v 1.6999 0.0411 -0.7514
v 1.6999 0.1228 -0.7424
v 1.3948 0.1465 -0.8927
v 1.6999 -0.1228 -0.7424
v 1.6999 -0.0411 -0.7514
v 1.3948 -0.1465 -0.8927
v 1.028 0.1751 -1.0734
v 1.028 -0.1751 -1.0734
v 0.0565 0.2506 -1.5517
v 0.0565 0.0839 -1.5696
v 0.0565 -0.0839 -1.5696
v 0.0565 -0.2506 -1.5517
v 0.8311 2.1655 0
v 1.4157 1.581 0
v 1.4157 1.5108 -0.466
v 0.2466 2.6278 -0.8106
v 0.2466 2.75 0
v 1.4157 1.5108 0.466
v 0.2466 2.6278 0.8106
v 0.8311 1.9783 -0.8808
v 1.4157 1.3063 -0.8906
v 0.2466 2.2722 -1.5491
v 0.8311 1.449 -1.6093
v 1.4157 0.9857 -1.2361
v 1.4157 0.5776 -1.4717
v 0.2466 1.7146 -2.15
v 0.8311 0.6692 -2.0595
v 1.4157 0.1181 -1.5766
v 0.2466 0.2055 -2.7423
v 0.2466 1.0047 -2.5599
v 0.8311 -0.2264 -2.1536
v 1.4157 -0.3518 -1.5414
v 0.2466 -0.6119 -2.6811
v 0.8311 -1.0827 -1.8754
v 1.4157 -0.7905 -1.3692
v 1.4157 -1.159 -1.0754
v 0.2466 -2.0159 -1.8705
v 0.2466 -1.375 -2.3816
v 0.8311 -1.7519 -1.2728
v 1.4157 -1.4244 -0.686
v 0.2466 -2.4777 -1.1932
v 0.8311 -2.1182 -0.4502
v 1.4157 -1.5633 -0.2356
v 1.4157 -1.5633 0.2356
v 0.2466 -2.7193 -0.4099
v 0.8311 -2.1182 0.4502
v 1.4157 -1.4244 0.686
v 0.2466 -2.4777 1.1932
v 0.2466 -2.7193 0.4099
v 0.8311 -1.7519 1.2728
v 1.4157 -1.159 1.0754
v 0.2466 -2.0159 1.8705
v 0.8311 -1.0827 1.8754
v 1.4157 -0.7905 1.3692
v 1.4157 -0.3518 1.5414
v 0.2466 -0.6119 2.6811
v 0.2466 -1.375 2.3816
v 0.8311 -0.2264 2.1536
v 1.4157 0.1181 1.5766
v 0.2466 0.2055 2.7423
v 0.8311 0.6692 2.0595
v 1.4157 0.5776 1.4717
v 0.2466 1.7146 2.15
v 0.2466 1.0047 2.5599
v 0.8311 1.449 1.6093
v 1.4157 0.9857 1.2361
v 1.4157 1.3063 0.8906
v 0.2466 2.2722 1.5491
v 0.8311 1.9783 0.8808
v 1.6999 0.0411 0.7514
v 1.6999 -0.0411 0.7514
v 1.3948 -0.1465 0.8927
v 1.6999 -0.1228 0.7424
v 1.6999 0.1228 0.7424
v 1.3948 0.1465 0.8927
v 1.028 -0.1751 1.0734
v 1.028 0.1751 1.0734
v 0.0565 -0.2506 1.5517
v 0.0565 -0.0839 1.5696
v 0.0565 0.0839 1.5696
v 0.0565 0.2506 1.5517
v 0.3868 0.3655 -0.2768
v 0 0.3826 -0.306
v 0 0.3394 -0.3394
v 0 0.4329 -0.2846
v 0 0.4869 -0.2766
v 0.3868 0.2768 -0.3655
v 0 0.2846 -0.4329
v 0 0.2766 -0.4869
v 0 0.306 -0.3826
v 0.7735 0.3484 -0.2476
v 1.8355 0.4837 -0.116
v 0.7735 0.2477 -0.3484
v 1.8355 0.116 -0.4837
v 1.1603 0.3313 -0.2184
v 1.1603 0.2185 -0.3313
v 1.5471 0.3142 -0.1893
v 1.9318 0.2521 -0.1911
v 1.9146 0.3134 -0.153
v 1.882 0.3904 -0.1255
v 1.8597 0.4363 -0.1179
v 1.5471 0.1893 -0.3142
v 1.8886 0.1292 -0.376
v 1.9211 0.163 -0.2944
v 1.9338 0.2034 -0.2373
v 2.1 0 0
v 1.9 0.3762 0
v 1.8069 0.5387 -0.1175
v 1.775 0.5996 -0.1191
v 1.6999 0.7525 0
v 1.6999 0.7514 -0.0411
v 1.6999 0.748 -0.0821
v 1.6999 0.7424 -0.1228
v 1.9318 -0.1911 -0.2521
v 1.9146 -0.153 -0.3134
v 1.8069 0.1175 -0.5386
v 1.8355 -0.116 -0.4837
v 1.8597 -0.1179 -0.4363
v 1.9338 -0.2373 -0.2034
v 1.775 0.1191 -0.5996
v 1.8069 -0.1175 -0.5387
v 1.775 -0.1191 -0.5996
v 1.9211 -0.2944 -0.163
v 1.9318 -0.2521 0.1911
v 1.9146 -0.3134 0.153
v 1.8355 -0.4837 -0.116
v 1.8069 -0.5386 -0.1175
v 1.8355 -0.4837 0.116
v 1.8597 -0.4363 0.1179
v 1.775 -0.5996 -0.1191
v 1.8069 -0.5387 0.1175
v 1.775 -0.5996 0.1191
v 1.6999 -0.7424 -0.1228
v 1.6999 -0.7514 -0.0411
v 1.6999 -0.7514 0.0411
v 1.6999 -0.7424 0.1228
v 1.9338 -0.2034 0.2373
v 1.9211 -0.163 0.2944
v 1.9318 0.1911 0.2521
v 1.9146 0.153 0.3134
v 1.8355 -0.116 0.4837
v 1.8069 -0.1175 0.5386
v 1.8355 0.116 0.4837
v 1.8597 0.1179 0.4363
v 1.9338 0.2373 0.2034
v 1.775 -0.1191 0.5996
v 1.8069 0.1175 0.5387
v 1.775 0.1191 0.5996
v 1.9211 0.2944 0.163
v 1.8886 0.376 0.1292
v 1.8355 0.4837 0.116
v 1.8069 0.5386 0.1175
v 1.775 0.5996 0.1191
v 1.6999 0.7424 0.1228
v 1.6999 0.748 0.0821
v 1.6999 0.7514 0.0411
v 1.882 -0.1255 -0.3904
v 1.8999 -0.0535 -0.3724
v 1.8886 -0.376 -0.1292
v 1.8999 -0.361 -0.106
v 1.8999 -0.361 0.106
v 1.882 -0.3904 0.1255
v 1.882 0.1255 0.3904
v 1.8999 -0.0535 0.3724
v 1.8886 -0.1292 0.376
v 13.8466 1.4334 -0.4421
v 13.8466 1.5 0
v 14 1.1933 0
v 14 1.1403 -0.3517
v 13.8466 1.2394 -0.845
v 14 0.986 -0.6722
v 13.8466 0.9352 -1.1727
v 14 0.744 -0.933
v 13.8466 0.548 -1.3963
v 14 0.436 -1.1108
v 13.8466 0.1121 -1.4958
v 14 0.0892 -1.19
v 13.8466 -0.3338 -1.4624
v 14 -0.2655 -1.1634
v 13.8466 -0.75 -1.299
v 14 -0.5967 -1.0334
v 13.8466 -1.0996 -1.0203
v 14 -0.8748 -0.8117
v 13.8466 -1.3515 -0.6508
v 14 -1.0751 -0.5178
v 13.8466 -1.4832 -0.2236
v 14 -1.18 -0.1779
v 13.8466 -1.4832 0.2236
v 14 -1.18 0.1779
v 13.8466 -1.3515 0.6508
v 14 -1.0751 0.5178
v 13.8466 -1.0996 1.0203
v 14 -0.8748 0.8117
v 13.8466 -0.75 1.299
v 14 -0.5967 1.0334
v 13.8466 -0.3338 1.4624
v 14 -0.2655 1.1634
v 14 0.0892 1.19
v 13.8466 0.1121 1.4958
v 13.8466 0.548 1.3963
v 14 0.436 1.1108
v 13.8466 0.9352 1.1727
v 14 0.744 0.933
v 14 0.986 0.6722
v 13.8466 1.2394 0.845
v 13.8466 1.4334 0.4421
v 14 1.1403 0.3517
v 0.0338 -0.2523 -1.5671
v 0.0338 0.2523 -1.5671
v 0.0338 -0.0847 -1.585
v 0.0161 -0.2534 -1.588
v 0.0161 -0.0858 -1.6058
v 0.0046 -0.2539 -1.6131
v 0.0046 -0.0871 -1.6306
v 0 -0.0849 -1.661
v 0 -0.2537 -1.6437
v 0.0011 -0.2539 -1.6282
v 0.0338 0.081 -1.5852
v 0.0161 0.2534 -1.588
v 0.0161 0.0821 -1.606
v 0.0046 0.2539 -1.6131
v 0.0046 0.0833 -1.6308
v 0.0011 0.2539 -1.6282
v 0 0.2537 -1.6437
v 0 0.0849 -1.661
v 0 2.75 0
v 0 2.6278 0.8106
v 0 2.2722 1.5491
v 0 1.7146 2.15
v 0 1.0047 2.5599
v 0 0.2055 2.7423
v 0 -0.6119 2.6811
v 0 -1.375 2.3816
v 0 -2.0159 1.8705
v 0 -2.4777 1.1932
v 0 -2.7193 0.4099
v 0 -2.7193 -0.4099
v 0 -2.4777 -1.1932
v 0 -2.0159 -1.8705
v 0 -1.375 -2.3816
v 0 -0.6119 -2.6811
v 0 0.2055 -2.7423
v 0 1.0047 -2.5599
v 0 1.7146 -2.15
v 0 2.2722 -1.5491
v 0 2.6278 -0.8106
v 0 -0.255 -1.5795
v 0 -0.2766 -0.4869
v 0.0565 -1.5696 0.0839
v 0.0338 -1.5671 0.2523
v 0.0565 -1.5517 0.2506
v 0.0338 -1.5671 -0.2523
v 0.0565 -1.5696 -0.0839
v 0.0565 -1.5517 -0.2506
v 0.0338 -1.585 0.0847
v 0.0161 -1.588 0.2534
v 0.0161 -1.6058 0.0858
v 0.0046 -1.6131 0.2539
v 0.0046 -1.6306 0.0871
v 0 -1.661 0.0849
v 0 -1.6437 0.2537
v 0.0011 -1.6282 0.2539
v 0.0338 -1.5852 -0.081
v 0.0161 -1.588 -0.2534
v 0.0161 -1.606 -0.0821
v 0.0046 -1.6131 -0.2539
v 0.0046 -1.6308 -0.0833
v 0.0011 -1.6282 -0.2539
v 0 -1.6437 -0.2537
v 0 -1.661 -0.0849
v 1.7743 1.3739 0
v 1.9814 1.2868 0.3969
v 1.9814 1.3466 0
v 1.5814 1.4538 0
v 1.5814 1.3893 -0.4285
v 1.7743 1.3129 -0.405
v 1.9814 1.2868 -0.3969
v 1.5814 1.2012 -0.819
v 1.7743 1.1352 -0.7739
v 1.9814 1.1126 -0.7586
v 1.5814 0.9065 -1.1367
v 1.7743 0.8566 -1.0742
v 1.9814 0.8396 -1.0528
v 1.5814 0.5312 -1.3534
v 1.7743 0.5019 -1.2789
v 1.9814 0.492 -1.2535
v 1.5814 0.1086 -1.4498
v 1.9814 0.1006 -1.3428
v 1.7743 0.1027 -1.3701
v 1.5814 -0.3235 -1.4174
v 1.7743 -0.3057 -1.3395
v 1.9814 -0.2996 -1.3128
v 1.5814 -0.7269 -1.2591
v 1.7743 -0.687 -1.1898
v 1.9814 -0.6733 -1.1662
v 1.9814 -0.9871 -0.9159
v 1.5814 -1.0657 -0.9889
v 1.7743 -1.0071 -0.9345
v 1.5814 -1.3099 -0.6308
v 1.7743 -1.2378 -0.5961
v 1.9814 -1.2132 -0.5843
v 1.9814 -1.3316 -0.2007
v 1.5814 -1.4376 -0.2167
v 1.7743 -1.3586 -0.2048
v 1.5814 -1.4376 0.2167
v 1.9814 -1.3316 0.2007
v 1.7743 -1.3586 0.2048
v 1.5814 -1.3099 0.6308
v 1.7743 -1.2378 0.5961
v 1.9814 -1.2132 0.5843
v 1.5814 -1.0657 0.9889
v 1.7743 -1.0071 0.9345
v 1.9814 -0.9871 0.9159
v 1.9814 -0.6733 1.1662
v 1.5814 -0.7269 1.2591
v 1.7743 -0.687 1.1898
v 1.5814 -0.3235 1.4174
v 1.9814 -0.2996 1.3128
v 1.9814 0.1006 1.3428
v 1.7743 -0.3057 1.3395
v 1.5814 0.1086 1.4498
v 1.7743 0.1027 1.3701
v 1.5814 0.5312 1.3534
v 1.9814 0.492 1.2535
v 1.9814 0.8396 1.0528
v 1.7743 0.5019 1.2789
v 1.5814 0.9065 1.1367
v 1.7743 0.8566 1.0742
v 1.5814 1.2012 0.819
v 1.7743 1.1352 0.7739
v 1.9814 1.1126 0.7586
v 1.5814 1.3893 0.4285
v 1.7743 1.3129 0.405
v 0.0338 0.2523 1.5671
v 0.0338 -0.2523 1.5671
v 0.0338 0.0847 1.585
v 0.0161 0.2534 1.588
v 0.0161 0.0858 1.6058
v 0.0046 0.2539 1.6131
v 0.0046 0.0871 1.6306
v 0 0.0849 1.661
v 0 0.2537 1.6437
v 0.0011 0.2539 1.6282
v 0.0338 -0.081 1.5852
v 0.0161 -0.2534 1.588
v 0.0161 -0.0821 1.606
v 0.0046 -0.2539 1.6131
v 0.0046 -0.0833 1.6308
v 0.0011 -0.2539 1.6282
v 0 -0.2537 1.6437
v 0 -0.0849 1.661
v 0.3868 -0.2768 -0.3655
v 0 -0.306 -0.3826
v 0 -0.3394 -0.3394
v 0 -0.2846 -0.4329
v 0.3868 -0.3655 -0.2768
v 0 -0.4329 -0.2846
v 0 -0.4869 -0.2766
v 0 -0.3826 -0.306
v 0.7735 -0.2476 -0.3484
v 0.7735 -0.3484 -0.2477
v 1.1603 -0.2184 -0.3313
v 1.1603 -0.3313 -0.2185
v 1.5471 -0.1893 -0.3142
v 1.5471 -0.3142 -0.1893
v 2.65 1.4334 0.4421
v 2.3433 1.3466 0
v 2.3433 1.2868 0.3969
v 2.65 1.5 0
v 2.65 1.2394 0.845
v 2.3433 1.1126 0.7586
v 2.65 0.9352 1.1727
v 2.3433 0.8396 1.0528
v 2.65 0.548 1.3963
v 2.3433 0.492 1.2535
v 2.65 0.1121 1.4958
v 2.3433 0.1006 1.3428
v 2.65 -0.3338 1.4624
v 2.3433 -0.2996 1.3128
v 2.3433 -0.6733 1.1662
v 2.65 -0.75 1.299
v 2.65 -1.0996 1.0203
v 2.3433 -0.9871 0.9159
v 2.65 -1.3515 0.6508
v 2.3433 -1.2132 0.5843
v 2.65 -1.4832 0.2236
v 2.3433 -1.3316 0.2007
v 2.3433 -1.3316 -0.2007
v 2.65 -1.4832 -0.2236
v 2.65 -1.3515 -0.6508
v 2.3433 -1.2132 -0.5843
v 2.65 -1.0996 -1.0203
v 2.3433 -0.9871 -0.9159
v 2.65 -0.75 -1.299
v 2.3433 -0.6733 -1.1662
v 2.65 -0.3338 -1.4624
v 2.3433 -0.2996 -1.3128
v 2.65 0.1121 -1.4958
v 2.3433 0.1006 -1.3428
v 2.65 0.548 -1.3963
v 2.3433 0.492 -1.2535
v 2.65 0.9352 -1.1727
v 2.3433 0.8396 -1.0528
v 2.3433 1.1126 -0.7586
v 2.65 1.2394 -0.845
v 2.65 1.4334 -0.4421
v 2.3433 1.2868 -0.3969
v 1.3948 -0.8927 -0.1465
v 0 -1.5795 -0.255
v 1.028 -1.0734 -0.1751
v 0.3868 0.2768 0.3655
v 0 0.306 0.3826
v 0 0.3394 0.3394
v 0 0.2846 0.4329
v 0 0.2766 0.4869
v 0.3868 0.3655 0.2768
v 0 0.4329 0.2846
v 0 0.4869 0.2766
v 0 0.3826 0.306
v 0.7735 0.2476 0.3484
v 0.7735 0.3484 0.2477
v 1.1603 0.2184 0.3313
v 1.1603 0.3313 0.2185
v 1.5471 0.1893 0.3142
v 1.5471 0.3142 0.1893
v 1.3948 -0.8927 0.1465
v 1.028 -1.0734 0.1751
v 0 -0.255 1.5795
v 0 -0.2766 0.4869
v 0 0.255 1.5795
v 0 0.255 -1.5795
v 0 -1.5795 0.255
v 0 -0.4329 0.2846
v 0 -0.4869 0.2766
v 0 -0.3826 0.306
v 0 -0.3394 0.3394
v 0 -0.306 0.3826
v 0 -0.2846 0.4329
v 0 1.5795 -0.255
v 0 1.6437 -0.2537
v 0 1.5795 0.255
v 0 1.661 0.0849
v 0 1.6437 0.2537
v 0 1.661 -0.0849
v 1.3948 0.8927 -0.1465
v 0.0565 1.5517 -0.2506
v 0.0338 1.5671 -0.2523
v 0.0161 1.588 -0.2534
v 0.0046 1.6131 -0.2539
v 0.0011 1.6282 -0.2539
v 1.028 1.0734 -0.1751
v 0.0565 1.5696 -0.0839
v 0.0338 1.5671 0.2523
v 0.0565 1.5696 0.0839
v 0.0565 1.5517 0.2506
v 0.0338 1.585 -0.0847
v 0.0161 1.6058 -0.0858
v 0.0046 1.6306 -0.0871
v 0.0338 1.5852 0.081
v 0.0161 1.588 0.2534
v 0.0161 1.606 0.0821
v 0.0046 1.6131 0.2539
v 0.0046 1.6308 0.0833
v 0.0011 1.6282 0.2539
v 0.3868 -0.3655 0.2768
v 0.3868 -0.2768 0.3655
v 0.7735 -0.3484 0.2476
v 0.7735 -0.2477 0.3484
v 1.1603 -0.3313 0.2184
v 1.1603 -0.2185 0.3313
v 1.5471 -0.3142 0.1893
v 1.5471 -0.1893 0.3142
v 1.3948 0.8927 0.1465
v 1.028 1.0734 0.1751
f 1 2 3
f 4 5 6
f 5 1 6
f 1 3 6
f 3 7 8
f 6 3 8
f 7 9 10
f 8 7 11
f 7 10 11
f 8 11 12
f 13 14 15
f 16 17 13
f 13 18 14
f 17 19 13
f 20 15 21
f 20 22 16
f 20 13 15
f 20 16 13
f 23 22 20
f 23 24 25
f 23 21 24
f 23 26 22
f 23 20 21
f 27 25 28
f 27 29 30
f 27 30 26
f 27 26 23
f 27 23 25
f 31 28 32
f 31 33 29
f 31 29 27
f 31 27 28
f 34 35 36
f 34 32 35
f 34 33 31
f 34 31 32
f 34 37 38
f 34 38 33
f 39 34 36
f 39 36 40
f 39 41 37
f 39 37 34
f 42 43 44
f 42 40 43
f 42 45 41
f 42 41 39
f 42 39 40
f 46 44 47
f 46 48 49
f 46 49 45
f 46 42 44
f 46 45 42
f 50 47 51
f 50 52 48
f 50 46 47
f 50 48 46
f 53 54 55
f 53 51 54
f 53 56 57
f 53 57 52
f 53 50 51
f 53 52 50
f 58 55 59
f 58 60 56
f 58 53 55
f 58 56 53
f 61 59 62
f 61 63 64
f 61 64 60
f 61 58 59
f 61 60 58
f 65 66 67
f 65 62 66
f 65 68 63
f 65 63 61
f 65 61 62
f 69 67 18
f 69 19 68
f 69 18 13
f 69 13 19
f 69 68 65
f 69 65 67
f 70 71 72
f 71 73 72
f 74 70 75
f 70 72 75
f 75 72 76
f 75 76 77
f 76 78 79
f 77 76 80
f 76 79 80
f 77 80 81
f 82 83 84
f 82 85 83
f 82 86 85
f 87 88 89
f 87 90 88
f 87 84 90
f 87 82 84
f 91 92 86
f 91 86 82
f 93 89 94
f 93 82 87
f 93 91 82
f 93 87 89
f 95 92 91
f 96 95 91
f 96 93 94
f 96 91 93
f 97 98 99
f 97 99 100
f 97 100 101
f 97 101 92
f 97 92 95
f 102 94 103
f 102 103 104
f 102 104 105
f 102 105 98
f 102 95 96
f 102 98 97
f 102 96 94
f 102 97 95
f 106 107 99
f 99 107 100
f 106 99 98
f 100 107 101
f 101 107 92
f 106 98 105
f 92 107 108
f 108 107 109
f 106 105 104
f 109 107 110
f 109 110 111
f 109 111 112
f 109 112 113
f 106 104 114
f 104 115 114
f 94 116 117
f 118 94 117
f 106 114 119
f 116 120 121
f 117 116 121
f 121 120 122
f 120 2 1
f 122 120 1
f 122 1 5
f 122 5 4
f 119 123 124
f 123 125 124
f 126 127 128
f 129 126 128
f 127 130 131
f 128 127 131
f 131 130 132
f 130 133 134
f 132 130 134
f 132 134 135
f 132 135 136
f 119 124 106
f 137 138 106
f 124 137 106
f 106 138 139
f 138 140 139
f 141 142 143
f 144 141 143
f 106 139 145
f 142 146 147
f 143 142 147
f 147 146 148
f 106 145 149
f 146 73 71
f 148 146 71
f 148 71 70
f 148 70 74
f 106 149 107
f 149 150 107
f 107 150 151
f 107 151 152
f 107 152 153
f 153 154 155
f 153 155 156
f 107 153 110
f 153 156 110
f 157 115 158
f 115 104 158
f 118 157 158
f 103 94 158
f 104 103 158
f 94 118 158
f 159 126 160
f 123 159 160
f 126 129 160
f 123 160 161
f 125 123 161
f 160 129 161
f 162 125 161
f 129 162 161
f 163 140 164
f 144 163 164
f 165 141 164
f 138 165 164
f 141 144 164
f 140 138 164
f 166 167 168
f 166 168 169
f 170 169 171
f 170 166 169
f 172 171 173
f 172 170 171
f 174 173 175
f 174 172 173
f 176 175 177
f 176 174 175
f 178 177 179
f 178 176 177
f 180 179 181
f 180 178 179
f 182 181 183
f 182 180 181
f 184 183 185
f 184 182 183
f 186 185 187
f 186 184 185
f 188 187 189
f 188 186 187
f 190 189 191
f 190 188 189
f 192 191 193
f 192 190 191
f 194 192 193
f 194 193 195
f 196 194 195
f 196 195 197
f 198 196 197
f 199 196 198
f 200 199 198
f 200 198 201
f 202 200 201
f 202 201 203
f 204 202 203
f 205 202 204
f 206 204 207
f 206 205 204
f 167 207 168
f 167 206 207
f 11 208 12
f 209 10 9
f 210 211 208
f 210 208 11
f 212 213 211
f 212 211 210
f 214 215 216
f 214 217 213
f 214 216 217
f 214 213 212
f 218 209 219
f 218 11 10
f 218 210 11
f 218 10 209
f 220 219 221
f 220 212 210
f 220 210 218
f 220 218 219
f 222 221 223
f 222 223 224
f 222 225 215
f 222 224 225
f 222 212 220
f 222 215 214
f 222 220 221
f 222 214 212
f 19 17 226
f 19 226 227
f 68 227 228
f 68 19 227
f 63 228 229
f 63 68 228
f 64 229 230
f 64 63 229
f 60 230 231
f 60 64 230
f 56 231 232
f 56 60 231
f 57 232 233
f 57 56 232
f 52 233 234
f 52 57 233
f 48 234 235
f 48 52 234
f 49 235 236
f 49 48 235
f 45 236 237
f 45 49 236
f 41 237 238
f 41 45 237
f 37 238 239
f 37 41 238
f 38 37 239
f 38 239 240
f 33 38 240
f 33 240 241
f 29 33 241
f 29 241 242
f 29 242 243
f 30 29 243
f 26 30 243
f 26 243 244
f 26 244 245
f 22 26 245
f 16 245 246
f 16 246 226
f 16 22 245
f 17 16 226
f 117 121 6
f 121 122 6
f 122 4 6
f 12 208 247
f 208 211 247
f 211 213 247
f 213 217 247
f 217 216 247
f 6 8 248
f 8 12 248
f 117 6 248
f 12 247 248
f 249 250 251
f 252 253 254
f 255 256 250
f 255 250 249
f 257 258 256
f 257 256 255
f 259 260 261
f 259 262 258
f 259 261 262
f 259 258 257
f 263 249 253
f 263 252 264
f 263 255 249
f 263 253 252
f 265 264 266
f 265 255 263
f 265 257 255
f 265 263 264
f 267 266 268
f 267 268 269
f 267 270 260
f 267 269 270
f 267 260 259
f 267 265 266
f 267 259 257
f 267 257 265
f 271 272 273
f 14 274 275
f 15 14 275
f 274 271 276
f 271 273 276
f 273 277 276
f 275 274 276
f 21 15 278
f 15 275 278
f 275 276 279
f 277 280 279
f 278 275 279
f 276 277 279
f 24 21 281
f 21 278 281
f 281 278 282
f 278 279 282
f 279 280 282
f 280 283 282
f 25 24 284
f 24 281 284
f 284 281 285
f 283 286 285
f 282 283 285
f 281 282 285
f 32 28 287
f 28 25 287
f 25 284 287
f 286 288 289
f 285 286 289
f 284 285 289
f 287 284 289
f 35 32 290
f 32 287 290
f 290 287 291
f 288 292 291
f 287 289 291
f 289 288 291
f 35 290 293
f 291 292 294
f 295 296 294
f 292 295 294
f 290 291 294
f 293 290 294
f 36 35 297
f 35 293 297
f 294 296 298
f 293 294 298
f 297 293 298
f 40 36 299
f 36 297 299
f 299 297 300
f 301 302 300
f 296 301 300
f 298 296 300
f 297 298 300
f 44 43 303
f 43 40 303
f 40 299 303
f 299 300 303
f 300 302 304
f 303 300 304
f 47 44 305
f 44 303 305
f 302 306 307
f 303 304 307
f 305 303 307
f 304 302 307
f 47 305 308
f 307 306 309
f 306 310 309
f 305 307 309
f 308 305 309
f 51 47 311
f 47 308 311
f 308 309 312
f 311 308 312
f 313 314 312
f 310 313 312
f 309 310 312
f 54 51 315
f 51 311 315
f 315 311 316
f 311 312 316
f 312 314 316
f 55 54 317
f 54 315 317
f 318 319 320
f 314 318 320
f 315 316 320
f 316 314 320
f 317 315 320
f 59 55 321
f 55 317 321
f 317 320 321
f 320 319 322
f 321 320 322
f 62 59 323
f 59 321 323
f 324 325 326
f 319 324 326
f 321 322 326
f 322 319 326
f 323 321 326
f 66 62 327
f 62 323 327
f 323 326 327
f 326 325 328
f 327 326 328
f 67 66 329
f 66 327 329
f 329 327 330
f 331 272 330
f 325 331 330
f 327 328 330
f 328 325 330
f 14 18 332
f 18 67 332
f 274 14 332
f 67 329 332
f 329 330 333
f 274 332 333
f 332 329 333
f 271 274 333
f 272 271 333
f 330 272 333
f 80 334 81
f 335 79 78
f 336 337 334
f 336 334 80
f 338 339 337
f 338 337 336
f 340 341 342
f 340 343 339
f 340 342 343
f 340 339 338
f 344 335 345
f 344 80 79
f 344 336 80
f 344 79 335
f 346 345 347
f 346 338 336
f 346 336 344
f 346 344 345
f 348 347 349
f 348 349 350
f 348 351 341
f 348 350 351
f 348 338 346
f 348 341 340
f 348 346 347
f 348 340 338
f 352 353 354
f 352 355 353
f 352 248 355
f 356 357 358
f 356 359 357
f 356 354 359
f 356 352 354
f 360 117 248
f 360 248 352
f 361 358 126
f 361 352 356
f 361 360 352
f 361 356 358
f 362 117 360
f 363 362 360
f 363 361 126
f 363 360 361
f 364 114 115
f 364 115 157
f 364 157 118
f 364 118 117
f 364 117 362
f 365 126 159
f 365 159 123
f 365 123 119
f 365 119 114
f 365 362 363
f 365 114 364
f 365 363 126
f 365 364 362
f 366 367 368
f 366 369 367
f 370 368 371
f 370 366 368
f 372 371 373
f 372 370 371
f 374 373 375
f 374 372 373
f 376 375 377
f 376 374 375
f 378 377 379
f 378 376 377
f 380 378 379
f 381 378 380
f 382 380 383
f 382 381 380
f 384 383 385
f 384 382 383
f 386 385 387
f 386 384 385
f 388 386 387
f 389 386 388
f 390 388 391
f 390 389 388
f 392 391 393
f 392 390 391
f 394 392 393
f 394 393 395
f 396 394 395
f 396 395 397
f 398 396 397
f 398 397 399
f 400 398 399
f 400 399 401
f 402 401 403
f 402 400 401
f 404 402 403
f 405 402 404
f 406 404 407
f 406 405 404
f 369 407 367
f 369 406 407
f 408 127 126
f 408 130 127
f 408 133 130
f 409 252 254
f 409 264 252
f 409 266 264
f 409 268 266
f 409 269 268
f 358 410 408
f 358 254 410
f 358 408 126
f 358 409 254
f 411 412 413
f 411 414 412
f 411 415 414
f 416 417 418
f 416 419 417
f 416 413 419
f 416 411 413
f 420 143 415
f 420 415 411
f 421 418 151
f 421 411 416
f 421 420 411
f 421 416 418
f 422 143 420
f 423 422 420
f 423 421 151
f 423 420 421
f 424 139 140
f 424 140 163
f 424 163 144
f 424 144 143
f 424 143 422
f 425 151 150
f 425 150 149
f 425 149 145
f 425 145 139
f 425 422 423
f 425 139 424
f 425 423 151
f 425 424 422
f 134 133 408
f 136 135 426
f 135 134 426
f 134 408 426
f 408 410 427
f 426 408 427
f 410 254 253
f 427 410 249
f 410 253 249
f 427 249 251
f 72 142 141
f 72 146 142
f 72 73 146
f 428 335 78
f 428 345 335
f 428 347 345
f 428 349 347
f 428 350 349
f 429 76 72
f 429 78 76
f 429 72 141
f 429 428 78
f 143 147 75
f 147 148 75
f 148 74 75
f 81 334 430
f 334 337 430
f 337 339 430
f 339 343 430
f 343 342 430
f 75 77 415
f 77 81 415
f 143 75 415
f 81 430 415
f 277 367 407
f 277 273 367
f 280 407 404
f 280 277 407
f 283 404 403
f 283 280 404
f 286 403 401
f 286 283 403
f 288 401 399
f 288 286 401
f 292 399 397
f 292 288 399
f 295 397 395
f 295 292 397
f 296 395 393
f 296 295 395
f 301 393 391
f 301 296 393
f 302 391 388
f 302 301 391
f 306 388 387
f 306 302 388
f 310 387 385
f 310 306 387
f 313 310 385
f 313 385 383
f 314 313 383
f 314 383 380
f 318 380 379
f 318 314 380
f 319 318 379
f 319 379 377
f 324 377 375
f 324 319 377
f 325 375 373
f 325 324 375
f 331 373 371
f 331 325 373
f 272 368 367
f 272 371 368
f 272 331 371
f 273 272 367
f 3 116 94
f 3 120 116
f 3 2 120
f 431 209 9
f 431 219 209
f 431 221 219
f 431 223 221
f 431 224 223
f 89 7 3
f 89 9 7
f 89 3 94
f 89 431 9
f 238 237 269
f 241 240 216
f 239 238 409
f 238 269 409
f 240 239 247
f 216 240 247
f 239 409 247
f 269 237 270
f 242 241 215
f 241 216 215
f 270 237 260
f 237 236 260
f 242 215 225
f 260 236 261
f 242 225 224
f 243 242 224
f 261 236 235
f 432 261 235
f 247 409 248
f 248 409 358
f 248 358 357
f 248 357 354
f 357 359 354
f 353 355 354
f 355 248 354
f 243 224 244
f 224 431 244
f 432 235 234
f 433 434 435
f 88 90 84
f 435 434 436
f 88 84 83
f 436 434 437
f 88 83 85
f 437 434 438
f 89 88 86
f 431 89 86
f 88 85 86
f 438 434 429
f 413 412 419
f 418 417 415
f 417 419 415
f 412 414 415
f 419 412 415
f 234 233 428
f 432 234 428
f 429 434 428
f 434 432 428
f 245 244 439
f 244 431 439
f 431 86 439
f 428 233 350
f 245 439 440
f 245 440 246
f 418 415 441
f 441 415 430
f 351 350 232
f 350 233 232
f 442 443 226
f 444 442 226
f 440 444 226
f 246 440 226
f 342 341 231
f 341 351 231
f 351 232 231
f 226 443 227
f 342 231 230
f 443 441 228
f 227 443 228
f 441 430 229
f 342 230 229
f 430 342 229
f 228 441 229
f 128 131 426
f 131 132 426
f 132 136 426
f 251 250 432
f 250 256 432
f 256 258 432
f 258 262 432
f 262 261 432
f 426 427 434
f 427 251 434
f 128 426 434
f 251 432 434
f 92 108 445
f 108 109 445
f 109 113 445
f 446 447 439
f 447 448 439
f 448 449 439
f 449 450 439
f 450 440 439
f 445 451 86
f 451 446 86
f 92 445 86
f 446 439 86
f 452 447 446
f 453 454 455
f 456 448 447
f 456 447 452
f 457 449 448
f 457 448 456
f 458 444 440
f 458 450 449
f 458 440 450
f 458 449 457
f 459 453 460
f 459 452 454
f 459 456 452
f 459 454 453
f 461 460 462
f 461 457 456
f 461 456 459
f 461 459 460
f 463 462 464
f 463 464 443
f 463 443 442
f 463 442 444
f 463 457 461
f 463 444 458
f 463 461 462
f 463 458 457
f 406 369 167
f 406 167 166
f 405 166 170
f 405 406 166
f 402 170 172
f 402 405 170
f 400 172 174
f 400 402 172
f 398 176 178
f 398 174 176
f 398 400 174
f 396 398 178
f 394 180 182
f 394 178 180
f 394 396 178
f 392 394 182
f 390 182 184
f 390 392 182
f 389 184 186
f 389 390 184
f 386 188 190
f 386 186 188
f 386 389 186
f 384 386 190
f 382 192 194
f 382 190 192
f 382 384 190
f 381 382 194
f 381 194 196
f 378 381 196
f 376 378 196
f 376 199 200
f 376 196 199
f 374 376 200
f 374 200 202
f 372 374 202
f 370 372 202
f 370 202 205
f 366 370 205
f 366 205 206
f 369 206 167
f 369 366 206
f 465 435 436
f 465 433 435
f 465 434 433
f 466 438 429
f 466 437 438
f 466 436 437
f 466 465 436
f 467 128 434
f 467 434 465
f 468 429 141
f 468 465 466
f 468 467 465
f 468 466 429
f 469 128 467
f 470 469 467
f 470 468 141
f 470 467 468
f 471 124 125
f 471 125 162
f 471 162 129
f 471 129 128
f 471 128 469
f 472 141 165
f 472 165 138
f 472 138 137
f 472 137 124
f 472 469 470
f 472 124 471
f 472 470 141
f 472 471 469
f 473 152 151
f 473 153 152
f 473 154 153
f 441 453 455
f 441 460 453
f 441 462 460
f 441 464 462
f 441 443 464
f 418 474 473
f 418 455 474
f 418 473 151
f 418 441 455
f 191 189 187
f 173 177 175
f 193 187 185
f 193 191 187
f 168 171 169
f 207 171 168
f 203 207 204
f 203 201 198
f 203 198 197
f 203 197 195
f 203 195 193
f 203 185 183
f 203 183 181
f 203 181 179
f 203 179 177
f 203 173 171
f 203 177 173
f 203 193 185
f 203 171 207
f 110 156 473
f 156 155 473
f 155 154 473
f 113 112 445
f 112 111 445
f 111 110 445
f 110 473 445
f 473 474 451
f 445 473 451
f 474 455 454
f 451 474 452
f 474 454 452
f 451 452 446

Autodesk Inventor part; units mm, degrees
ref_plane "YZ Plane" through (0, 0, 0) normal (1, 0, 0) x (0, 1, 0)
ref_plane "XZ Plane" through (0, 0, 0) normal (0, 1, 0) x (-1, 0, 0)
sketch "Sketch1" plane through (0, 0, 0) normal (0, 0, 1) x (1, 0, 0)
  line L0 (2.1, 0) -> (14, 0)
  line L1 (14, 0) -> (14, 1.5)
  line L2 (14, 1.5) -> (2.65, 1.5)
  line L3 (2.65, 1.5) -> (2.3433, 1.3466)
  line L4 (2.3433, 1.3466) -> (1.9814, 1.3466)
  line L5 (0, 2.75) -> (0, 1.6)
  line L6 (0, 1.6) -> (1.6999, 0.7525)
  line L7 (1.6999, 0.7525) -> (2.1, 0)
  line L8 (-2.8, 0) -> (16.8, 0) projected
  line L9 (0, -0.55) -> (0, 3.3) projected
  line L10 (0, 2.75) -> (0.2466, 2.75)
  line L11 (0.2466, 2.75) -> (1.4157, 1.581)
  line L12 (2.65, 1.5) -> (1.4966, 1.5) construction
  arc A0 (1.4157, 1.581) -> (1.9814, 1.3466) centre (1.9814, 2.1466) ccw
  point P0 (1.65, 1.3466)
  dimension "d1" = 11.35
  dimension "d2" = 3
  dimension "d3" = 2.6933
  dimension "d4" = 3.2
  dimension "d5" = 26.5
  dimension "d6" = 62
  dimension "d7" = 2.1
  dimension "d8" = 0.3067
  dimension "d12" = 5.5
  dimension "d13" = 45
  dimension "d15" = 14
  dimension "d24" = 1.65
  dimension "d93" = 0.8
revolve "Body" add sketch "Sketch1" angle 360 about axis through (2.1, 0, 0) along (1, 0, 0) contours L7 L6 L5 L10 L11 A0 L4 L3 L2 L1 L0
sketch "Sketch2" plane through (0, 0, 0) normal (-1, 0, 0) x (0, 0, 1)
  line L0 (0, 1.6) -> (0, 0) construction
  line L1 (0, 0) -> (1.6, 0) construction
  arc A0 (0.48, 0) -> (0, 0.48) centre (0, 0) ccw construction
  arc A1 (0.56, 0) -> (0, 0.56) centre (0, 0) ccw construction
  arc A2 (1.5795, 0.255) -> (0.255, 1.5795) centre (0, 0) ccw
  line L2 (0, 0) -> (1.1314, 1.1314) construction
  line L3 (0.255, 1.5795) -> (0.2766, 0.4869)
  line L4 (1.5795, 0.255) -> (0.4869, 0.2766)
  arc A3 (0.255, 1.5795) -> (0, 1.6) centre (0, 0) ccw
  arc A4 (1.6, 0) -> (1.5795, 0.255) centre (0, 0) ccw
  line L5 (0, -3.85) -> (0, 3.85) projected
  line L6 (-3.85, 0) -> (3.85, 0) projected
  arc A5 (0.255, -1.5795) -> (1.5795, -0.255) centre (0, 0) ccw
  line L7 (0.255, -1.5795) -> (0.2766, -0.4869)
  line L8 (1.5795, -0.255) -> (0.4869, -0.2766)
  arc A6 (0, -1.6) -> (0.255, -1.5795) centre (0, 0) ccw
  arc A7 (1.5795, -0.255) -> (1.6, 0) centre (0, 0) ccw
  arc A8 (-0.255, 1.5795) -> (-1.5795, 0.255) centre (0, 0) ccw
  line L9 (-0.255, 1.5795) -> (-0.2766, 0.4869)
  line L10 (-1.5795, 0.255) -> (-0.4869, 0.2766)
  arc A9 (0, 1.6) -> (-0.255, 1.5795) centre (0, 0) ccw
  arc A10 (-1.5795, 0.255) -> (-1.6, 0) centre (0, 0) ccw
  arc A11 (-0.255, -1.5795) -> (0, -1.6) centre (0, 0) ccw
  arc A12 (-1.5795, -0.255) -> (-0.255, -1.5795) centre (0, 0) ccw
  arc A13 (-1.6, 0) -> (-1.5795, -0.255) centre (0, 0) ccw
  line L11 (-1.5795, -0.255) -> (-0.4869, -0.2766)
  line L12 (-0.255, -1.5795) -> (-0.2766, -0.4869)
  arc A14 (0.2766, 0.4869) -> (0.4869, 0.2766) centre (0.4912, 0.4912) ccw
  arc A15 (0.4869, -0.2766) -> (0.2766, -0.4869) centre (0.4912, -0.4912) ccw
  arc A16 (-0.4869, 0.2766) -> (-0.2766, 0.4869) centre (-0.4912, 0.4912) ccw
  arc A17 (-0.2766, -0.4869) -> (-0.4869, -0.2766) centre (-0.4912, -0.4912) ccw
  point P0 (1.1314, -1.1314)
  point P1 (-1.1314, 1.1314)
  point P2 (-1.1314, -1.1314)
  dimension "d17" = 0.96
  dimension "d18" = 1.12
  dimension "d19" = 3.2
  dimension "d20" = 45
  dimension "d21" = 0.255
extrude "Slot" add sketch "Sketch2" against normal up to next draft 5 contours L4 A14 L3 A2 | A5 L7 A15 L8 | L9 A16 L10 A8 | A12 L11 A17 L12
fillet "Fillet1" radius 0.102 4 edges at (0, 1.6, 0) (0, 0, -1.6) (0, -1.6, 0) (0, 0, 1.6)
thread "Thread" size "M3x0.5" class "6g" standard "ISO Metric profile" length 11.35
chamfer "Chamfer1" distance 0.3067 distance2 0.1534 1 edges at (14, -1.5, 0) measured on face at (14, 0.263, 0.1197)
ref_plane "Work Plane2" through (3.35, 0, 0) normal (0, 0, -1) x (1, 0, 0)
equation "\"d1\" = GEL"
equation "\"d2\" = GD"
equation "\"d3\" = BDM"
equation "\"d4\" = SDM"
equation "\"d7\" = INTI"
equation "\"d8\" = GAL"
equation "\"d12\" = KOD"
equation "\"d13\" = 0.5 * SEWI"
equation "\"d15\" = NLG"
equation "\"d24\" = KOH"
equation "\"d93\" = R"
equation "\"d17\" = 0.3 * SDM"
equation "\"d18\" = 0.35 * SDM"
equation "\"d19\" = SDM"
equation "\"d21\" = 0.5 * SBR"
equation "\"d23\" = 0.2 * SBR"
equation "\"d10\" = GEL"
equation "\"d25\" = -0.5 * SPD + 0.5 * GD"
equation "\"d26\" = 0.5 * GAL"
equation "\"NLG\" = 14"
equation "\"GEL\" = 11.35"
equation "\"GAL\" = 0.61345 * PTC"
equation "\"SPD\" = NND - 1.2269 * PTC"
equation "\"KOD\" = 5.5"
equation "\"KOH\" = 1.65"
equation "\"SBR\" = 0.51"
equation "\"INTI\" = 2.1"
equation "\"SDM\" = 3.2"
equation "\"GD\" = NND"
equation "\"BDM\" = NND - GAL"
equation "\"SEWI\" = 90deg"
equation "\"d9\" = SDM"
equation "\"R\" = 0.8"
equation "\"GUL\" = 0.61345 * PTC"
equation "\"TOA\" = 30deg"
equation "\"EPV\" = 3.15"
equation "\"THREADDIA\" = 3"
equation "\"PTC\" = 0.5"
equation "\"NND\" = 3"
equation "\"GD1\" = THREADDIA - 1.2269 * PTC"
properties part number "ISO 7046-1  - M3 x 14 - 4.8 - H" material "Steel"
